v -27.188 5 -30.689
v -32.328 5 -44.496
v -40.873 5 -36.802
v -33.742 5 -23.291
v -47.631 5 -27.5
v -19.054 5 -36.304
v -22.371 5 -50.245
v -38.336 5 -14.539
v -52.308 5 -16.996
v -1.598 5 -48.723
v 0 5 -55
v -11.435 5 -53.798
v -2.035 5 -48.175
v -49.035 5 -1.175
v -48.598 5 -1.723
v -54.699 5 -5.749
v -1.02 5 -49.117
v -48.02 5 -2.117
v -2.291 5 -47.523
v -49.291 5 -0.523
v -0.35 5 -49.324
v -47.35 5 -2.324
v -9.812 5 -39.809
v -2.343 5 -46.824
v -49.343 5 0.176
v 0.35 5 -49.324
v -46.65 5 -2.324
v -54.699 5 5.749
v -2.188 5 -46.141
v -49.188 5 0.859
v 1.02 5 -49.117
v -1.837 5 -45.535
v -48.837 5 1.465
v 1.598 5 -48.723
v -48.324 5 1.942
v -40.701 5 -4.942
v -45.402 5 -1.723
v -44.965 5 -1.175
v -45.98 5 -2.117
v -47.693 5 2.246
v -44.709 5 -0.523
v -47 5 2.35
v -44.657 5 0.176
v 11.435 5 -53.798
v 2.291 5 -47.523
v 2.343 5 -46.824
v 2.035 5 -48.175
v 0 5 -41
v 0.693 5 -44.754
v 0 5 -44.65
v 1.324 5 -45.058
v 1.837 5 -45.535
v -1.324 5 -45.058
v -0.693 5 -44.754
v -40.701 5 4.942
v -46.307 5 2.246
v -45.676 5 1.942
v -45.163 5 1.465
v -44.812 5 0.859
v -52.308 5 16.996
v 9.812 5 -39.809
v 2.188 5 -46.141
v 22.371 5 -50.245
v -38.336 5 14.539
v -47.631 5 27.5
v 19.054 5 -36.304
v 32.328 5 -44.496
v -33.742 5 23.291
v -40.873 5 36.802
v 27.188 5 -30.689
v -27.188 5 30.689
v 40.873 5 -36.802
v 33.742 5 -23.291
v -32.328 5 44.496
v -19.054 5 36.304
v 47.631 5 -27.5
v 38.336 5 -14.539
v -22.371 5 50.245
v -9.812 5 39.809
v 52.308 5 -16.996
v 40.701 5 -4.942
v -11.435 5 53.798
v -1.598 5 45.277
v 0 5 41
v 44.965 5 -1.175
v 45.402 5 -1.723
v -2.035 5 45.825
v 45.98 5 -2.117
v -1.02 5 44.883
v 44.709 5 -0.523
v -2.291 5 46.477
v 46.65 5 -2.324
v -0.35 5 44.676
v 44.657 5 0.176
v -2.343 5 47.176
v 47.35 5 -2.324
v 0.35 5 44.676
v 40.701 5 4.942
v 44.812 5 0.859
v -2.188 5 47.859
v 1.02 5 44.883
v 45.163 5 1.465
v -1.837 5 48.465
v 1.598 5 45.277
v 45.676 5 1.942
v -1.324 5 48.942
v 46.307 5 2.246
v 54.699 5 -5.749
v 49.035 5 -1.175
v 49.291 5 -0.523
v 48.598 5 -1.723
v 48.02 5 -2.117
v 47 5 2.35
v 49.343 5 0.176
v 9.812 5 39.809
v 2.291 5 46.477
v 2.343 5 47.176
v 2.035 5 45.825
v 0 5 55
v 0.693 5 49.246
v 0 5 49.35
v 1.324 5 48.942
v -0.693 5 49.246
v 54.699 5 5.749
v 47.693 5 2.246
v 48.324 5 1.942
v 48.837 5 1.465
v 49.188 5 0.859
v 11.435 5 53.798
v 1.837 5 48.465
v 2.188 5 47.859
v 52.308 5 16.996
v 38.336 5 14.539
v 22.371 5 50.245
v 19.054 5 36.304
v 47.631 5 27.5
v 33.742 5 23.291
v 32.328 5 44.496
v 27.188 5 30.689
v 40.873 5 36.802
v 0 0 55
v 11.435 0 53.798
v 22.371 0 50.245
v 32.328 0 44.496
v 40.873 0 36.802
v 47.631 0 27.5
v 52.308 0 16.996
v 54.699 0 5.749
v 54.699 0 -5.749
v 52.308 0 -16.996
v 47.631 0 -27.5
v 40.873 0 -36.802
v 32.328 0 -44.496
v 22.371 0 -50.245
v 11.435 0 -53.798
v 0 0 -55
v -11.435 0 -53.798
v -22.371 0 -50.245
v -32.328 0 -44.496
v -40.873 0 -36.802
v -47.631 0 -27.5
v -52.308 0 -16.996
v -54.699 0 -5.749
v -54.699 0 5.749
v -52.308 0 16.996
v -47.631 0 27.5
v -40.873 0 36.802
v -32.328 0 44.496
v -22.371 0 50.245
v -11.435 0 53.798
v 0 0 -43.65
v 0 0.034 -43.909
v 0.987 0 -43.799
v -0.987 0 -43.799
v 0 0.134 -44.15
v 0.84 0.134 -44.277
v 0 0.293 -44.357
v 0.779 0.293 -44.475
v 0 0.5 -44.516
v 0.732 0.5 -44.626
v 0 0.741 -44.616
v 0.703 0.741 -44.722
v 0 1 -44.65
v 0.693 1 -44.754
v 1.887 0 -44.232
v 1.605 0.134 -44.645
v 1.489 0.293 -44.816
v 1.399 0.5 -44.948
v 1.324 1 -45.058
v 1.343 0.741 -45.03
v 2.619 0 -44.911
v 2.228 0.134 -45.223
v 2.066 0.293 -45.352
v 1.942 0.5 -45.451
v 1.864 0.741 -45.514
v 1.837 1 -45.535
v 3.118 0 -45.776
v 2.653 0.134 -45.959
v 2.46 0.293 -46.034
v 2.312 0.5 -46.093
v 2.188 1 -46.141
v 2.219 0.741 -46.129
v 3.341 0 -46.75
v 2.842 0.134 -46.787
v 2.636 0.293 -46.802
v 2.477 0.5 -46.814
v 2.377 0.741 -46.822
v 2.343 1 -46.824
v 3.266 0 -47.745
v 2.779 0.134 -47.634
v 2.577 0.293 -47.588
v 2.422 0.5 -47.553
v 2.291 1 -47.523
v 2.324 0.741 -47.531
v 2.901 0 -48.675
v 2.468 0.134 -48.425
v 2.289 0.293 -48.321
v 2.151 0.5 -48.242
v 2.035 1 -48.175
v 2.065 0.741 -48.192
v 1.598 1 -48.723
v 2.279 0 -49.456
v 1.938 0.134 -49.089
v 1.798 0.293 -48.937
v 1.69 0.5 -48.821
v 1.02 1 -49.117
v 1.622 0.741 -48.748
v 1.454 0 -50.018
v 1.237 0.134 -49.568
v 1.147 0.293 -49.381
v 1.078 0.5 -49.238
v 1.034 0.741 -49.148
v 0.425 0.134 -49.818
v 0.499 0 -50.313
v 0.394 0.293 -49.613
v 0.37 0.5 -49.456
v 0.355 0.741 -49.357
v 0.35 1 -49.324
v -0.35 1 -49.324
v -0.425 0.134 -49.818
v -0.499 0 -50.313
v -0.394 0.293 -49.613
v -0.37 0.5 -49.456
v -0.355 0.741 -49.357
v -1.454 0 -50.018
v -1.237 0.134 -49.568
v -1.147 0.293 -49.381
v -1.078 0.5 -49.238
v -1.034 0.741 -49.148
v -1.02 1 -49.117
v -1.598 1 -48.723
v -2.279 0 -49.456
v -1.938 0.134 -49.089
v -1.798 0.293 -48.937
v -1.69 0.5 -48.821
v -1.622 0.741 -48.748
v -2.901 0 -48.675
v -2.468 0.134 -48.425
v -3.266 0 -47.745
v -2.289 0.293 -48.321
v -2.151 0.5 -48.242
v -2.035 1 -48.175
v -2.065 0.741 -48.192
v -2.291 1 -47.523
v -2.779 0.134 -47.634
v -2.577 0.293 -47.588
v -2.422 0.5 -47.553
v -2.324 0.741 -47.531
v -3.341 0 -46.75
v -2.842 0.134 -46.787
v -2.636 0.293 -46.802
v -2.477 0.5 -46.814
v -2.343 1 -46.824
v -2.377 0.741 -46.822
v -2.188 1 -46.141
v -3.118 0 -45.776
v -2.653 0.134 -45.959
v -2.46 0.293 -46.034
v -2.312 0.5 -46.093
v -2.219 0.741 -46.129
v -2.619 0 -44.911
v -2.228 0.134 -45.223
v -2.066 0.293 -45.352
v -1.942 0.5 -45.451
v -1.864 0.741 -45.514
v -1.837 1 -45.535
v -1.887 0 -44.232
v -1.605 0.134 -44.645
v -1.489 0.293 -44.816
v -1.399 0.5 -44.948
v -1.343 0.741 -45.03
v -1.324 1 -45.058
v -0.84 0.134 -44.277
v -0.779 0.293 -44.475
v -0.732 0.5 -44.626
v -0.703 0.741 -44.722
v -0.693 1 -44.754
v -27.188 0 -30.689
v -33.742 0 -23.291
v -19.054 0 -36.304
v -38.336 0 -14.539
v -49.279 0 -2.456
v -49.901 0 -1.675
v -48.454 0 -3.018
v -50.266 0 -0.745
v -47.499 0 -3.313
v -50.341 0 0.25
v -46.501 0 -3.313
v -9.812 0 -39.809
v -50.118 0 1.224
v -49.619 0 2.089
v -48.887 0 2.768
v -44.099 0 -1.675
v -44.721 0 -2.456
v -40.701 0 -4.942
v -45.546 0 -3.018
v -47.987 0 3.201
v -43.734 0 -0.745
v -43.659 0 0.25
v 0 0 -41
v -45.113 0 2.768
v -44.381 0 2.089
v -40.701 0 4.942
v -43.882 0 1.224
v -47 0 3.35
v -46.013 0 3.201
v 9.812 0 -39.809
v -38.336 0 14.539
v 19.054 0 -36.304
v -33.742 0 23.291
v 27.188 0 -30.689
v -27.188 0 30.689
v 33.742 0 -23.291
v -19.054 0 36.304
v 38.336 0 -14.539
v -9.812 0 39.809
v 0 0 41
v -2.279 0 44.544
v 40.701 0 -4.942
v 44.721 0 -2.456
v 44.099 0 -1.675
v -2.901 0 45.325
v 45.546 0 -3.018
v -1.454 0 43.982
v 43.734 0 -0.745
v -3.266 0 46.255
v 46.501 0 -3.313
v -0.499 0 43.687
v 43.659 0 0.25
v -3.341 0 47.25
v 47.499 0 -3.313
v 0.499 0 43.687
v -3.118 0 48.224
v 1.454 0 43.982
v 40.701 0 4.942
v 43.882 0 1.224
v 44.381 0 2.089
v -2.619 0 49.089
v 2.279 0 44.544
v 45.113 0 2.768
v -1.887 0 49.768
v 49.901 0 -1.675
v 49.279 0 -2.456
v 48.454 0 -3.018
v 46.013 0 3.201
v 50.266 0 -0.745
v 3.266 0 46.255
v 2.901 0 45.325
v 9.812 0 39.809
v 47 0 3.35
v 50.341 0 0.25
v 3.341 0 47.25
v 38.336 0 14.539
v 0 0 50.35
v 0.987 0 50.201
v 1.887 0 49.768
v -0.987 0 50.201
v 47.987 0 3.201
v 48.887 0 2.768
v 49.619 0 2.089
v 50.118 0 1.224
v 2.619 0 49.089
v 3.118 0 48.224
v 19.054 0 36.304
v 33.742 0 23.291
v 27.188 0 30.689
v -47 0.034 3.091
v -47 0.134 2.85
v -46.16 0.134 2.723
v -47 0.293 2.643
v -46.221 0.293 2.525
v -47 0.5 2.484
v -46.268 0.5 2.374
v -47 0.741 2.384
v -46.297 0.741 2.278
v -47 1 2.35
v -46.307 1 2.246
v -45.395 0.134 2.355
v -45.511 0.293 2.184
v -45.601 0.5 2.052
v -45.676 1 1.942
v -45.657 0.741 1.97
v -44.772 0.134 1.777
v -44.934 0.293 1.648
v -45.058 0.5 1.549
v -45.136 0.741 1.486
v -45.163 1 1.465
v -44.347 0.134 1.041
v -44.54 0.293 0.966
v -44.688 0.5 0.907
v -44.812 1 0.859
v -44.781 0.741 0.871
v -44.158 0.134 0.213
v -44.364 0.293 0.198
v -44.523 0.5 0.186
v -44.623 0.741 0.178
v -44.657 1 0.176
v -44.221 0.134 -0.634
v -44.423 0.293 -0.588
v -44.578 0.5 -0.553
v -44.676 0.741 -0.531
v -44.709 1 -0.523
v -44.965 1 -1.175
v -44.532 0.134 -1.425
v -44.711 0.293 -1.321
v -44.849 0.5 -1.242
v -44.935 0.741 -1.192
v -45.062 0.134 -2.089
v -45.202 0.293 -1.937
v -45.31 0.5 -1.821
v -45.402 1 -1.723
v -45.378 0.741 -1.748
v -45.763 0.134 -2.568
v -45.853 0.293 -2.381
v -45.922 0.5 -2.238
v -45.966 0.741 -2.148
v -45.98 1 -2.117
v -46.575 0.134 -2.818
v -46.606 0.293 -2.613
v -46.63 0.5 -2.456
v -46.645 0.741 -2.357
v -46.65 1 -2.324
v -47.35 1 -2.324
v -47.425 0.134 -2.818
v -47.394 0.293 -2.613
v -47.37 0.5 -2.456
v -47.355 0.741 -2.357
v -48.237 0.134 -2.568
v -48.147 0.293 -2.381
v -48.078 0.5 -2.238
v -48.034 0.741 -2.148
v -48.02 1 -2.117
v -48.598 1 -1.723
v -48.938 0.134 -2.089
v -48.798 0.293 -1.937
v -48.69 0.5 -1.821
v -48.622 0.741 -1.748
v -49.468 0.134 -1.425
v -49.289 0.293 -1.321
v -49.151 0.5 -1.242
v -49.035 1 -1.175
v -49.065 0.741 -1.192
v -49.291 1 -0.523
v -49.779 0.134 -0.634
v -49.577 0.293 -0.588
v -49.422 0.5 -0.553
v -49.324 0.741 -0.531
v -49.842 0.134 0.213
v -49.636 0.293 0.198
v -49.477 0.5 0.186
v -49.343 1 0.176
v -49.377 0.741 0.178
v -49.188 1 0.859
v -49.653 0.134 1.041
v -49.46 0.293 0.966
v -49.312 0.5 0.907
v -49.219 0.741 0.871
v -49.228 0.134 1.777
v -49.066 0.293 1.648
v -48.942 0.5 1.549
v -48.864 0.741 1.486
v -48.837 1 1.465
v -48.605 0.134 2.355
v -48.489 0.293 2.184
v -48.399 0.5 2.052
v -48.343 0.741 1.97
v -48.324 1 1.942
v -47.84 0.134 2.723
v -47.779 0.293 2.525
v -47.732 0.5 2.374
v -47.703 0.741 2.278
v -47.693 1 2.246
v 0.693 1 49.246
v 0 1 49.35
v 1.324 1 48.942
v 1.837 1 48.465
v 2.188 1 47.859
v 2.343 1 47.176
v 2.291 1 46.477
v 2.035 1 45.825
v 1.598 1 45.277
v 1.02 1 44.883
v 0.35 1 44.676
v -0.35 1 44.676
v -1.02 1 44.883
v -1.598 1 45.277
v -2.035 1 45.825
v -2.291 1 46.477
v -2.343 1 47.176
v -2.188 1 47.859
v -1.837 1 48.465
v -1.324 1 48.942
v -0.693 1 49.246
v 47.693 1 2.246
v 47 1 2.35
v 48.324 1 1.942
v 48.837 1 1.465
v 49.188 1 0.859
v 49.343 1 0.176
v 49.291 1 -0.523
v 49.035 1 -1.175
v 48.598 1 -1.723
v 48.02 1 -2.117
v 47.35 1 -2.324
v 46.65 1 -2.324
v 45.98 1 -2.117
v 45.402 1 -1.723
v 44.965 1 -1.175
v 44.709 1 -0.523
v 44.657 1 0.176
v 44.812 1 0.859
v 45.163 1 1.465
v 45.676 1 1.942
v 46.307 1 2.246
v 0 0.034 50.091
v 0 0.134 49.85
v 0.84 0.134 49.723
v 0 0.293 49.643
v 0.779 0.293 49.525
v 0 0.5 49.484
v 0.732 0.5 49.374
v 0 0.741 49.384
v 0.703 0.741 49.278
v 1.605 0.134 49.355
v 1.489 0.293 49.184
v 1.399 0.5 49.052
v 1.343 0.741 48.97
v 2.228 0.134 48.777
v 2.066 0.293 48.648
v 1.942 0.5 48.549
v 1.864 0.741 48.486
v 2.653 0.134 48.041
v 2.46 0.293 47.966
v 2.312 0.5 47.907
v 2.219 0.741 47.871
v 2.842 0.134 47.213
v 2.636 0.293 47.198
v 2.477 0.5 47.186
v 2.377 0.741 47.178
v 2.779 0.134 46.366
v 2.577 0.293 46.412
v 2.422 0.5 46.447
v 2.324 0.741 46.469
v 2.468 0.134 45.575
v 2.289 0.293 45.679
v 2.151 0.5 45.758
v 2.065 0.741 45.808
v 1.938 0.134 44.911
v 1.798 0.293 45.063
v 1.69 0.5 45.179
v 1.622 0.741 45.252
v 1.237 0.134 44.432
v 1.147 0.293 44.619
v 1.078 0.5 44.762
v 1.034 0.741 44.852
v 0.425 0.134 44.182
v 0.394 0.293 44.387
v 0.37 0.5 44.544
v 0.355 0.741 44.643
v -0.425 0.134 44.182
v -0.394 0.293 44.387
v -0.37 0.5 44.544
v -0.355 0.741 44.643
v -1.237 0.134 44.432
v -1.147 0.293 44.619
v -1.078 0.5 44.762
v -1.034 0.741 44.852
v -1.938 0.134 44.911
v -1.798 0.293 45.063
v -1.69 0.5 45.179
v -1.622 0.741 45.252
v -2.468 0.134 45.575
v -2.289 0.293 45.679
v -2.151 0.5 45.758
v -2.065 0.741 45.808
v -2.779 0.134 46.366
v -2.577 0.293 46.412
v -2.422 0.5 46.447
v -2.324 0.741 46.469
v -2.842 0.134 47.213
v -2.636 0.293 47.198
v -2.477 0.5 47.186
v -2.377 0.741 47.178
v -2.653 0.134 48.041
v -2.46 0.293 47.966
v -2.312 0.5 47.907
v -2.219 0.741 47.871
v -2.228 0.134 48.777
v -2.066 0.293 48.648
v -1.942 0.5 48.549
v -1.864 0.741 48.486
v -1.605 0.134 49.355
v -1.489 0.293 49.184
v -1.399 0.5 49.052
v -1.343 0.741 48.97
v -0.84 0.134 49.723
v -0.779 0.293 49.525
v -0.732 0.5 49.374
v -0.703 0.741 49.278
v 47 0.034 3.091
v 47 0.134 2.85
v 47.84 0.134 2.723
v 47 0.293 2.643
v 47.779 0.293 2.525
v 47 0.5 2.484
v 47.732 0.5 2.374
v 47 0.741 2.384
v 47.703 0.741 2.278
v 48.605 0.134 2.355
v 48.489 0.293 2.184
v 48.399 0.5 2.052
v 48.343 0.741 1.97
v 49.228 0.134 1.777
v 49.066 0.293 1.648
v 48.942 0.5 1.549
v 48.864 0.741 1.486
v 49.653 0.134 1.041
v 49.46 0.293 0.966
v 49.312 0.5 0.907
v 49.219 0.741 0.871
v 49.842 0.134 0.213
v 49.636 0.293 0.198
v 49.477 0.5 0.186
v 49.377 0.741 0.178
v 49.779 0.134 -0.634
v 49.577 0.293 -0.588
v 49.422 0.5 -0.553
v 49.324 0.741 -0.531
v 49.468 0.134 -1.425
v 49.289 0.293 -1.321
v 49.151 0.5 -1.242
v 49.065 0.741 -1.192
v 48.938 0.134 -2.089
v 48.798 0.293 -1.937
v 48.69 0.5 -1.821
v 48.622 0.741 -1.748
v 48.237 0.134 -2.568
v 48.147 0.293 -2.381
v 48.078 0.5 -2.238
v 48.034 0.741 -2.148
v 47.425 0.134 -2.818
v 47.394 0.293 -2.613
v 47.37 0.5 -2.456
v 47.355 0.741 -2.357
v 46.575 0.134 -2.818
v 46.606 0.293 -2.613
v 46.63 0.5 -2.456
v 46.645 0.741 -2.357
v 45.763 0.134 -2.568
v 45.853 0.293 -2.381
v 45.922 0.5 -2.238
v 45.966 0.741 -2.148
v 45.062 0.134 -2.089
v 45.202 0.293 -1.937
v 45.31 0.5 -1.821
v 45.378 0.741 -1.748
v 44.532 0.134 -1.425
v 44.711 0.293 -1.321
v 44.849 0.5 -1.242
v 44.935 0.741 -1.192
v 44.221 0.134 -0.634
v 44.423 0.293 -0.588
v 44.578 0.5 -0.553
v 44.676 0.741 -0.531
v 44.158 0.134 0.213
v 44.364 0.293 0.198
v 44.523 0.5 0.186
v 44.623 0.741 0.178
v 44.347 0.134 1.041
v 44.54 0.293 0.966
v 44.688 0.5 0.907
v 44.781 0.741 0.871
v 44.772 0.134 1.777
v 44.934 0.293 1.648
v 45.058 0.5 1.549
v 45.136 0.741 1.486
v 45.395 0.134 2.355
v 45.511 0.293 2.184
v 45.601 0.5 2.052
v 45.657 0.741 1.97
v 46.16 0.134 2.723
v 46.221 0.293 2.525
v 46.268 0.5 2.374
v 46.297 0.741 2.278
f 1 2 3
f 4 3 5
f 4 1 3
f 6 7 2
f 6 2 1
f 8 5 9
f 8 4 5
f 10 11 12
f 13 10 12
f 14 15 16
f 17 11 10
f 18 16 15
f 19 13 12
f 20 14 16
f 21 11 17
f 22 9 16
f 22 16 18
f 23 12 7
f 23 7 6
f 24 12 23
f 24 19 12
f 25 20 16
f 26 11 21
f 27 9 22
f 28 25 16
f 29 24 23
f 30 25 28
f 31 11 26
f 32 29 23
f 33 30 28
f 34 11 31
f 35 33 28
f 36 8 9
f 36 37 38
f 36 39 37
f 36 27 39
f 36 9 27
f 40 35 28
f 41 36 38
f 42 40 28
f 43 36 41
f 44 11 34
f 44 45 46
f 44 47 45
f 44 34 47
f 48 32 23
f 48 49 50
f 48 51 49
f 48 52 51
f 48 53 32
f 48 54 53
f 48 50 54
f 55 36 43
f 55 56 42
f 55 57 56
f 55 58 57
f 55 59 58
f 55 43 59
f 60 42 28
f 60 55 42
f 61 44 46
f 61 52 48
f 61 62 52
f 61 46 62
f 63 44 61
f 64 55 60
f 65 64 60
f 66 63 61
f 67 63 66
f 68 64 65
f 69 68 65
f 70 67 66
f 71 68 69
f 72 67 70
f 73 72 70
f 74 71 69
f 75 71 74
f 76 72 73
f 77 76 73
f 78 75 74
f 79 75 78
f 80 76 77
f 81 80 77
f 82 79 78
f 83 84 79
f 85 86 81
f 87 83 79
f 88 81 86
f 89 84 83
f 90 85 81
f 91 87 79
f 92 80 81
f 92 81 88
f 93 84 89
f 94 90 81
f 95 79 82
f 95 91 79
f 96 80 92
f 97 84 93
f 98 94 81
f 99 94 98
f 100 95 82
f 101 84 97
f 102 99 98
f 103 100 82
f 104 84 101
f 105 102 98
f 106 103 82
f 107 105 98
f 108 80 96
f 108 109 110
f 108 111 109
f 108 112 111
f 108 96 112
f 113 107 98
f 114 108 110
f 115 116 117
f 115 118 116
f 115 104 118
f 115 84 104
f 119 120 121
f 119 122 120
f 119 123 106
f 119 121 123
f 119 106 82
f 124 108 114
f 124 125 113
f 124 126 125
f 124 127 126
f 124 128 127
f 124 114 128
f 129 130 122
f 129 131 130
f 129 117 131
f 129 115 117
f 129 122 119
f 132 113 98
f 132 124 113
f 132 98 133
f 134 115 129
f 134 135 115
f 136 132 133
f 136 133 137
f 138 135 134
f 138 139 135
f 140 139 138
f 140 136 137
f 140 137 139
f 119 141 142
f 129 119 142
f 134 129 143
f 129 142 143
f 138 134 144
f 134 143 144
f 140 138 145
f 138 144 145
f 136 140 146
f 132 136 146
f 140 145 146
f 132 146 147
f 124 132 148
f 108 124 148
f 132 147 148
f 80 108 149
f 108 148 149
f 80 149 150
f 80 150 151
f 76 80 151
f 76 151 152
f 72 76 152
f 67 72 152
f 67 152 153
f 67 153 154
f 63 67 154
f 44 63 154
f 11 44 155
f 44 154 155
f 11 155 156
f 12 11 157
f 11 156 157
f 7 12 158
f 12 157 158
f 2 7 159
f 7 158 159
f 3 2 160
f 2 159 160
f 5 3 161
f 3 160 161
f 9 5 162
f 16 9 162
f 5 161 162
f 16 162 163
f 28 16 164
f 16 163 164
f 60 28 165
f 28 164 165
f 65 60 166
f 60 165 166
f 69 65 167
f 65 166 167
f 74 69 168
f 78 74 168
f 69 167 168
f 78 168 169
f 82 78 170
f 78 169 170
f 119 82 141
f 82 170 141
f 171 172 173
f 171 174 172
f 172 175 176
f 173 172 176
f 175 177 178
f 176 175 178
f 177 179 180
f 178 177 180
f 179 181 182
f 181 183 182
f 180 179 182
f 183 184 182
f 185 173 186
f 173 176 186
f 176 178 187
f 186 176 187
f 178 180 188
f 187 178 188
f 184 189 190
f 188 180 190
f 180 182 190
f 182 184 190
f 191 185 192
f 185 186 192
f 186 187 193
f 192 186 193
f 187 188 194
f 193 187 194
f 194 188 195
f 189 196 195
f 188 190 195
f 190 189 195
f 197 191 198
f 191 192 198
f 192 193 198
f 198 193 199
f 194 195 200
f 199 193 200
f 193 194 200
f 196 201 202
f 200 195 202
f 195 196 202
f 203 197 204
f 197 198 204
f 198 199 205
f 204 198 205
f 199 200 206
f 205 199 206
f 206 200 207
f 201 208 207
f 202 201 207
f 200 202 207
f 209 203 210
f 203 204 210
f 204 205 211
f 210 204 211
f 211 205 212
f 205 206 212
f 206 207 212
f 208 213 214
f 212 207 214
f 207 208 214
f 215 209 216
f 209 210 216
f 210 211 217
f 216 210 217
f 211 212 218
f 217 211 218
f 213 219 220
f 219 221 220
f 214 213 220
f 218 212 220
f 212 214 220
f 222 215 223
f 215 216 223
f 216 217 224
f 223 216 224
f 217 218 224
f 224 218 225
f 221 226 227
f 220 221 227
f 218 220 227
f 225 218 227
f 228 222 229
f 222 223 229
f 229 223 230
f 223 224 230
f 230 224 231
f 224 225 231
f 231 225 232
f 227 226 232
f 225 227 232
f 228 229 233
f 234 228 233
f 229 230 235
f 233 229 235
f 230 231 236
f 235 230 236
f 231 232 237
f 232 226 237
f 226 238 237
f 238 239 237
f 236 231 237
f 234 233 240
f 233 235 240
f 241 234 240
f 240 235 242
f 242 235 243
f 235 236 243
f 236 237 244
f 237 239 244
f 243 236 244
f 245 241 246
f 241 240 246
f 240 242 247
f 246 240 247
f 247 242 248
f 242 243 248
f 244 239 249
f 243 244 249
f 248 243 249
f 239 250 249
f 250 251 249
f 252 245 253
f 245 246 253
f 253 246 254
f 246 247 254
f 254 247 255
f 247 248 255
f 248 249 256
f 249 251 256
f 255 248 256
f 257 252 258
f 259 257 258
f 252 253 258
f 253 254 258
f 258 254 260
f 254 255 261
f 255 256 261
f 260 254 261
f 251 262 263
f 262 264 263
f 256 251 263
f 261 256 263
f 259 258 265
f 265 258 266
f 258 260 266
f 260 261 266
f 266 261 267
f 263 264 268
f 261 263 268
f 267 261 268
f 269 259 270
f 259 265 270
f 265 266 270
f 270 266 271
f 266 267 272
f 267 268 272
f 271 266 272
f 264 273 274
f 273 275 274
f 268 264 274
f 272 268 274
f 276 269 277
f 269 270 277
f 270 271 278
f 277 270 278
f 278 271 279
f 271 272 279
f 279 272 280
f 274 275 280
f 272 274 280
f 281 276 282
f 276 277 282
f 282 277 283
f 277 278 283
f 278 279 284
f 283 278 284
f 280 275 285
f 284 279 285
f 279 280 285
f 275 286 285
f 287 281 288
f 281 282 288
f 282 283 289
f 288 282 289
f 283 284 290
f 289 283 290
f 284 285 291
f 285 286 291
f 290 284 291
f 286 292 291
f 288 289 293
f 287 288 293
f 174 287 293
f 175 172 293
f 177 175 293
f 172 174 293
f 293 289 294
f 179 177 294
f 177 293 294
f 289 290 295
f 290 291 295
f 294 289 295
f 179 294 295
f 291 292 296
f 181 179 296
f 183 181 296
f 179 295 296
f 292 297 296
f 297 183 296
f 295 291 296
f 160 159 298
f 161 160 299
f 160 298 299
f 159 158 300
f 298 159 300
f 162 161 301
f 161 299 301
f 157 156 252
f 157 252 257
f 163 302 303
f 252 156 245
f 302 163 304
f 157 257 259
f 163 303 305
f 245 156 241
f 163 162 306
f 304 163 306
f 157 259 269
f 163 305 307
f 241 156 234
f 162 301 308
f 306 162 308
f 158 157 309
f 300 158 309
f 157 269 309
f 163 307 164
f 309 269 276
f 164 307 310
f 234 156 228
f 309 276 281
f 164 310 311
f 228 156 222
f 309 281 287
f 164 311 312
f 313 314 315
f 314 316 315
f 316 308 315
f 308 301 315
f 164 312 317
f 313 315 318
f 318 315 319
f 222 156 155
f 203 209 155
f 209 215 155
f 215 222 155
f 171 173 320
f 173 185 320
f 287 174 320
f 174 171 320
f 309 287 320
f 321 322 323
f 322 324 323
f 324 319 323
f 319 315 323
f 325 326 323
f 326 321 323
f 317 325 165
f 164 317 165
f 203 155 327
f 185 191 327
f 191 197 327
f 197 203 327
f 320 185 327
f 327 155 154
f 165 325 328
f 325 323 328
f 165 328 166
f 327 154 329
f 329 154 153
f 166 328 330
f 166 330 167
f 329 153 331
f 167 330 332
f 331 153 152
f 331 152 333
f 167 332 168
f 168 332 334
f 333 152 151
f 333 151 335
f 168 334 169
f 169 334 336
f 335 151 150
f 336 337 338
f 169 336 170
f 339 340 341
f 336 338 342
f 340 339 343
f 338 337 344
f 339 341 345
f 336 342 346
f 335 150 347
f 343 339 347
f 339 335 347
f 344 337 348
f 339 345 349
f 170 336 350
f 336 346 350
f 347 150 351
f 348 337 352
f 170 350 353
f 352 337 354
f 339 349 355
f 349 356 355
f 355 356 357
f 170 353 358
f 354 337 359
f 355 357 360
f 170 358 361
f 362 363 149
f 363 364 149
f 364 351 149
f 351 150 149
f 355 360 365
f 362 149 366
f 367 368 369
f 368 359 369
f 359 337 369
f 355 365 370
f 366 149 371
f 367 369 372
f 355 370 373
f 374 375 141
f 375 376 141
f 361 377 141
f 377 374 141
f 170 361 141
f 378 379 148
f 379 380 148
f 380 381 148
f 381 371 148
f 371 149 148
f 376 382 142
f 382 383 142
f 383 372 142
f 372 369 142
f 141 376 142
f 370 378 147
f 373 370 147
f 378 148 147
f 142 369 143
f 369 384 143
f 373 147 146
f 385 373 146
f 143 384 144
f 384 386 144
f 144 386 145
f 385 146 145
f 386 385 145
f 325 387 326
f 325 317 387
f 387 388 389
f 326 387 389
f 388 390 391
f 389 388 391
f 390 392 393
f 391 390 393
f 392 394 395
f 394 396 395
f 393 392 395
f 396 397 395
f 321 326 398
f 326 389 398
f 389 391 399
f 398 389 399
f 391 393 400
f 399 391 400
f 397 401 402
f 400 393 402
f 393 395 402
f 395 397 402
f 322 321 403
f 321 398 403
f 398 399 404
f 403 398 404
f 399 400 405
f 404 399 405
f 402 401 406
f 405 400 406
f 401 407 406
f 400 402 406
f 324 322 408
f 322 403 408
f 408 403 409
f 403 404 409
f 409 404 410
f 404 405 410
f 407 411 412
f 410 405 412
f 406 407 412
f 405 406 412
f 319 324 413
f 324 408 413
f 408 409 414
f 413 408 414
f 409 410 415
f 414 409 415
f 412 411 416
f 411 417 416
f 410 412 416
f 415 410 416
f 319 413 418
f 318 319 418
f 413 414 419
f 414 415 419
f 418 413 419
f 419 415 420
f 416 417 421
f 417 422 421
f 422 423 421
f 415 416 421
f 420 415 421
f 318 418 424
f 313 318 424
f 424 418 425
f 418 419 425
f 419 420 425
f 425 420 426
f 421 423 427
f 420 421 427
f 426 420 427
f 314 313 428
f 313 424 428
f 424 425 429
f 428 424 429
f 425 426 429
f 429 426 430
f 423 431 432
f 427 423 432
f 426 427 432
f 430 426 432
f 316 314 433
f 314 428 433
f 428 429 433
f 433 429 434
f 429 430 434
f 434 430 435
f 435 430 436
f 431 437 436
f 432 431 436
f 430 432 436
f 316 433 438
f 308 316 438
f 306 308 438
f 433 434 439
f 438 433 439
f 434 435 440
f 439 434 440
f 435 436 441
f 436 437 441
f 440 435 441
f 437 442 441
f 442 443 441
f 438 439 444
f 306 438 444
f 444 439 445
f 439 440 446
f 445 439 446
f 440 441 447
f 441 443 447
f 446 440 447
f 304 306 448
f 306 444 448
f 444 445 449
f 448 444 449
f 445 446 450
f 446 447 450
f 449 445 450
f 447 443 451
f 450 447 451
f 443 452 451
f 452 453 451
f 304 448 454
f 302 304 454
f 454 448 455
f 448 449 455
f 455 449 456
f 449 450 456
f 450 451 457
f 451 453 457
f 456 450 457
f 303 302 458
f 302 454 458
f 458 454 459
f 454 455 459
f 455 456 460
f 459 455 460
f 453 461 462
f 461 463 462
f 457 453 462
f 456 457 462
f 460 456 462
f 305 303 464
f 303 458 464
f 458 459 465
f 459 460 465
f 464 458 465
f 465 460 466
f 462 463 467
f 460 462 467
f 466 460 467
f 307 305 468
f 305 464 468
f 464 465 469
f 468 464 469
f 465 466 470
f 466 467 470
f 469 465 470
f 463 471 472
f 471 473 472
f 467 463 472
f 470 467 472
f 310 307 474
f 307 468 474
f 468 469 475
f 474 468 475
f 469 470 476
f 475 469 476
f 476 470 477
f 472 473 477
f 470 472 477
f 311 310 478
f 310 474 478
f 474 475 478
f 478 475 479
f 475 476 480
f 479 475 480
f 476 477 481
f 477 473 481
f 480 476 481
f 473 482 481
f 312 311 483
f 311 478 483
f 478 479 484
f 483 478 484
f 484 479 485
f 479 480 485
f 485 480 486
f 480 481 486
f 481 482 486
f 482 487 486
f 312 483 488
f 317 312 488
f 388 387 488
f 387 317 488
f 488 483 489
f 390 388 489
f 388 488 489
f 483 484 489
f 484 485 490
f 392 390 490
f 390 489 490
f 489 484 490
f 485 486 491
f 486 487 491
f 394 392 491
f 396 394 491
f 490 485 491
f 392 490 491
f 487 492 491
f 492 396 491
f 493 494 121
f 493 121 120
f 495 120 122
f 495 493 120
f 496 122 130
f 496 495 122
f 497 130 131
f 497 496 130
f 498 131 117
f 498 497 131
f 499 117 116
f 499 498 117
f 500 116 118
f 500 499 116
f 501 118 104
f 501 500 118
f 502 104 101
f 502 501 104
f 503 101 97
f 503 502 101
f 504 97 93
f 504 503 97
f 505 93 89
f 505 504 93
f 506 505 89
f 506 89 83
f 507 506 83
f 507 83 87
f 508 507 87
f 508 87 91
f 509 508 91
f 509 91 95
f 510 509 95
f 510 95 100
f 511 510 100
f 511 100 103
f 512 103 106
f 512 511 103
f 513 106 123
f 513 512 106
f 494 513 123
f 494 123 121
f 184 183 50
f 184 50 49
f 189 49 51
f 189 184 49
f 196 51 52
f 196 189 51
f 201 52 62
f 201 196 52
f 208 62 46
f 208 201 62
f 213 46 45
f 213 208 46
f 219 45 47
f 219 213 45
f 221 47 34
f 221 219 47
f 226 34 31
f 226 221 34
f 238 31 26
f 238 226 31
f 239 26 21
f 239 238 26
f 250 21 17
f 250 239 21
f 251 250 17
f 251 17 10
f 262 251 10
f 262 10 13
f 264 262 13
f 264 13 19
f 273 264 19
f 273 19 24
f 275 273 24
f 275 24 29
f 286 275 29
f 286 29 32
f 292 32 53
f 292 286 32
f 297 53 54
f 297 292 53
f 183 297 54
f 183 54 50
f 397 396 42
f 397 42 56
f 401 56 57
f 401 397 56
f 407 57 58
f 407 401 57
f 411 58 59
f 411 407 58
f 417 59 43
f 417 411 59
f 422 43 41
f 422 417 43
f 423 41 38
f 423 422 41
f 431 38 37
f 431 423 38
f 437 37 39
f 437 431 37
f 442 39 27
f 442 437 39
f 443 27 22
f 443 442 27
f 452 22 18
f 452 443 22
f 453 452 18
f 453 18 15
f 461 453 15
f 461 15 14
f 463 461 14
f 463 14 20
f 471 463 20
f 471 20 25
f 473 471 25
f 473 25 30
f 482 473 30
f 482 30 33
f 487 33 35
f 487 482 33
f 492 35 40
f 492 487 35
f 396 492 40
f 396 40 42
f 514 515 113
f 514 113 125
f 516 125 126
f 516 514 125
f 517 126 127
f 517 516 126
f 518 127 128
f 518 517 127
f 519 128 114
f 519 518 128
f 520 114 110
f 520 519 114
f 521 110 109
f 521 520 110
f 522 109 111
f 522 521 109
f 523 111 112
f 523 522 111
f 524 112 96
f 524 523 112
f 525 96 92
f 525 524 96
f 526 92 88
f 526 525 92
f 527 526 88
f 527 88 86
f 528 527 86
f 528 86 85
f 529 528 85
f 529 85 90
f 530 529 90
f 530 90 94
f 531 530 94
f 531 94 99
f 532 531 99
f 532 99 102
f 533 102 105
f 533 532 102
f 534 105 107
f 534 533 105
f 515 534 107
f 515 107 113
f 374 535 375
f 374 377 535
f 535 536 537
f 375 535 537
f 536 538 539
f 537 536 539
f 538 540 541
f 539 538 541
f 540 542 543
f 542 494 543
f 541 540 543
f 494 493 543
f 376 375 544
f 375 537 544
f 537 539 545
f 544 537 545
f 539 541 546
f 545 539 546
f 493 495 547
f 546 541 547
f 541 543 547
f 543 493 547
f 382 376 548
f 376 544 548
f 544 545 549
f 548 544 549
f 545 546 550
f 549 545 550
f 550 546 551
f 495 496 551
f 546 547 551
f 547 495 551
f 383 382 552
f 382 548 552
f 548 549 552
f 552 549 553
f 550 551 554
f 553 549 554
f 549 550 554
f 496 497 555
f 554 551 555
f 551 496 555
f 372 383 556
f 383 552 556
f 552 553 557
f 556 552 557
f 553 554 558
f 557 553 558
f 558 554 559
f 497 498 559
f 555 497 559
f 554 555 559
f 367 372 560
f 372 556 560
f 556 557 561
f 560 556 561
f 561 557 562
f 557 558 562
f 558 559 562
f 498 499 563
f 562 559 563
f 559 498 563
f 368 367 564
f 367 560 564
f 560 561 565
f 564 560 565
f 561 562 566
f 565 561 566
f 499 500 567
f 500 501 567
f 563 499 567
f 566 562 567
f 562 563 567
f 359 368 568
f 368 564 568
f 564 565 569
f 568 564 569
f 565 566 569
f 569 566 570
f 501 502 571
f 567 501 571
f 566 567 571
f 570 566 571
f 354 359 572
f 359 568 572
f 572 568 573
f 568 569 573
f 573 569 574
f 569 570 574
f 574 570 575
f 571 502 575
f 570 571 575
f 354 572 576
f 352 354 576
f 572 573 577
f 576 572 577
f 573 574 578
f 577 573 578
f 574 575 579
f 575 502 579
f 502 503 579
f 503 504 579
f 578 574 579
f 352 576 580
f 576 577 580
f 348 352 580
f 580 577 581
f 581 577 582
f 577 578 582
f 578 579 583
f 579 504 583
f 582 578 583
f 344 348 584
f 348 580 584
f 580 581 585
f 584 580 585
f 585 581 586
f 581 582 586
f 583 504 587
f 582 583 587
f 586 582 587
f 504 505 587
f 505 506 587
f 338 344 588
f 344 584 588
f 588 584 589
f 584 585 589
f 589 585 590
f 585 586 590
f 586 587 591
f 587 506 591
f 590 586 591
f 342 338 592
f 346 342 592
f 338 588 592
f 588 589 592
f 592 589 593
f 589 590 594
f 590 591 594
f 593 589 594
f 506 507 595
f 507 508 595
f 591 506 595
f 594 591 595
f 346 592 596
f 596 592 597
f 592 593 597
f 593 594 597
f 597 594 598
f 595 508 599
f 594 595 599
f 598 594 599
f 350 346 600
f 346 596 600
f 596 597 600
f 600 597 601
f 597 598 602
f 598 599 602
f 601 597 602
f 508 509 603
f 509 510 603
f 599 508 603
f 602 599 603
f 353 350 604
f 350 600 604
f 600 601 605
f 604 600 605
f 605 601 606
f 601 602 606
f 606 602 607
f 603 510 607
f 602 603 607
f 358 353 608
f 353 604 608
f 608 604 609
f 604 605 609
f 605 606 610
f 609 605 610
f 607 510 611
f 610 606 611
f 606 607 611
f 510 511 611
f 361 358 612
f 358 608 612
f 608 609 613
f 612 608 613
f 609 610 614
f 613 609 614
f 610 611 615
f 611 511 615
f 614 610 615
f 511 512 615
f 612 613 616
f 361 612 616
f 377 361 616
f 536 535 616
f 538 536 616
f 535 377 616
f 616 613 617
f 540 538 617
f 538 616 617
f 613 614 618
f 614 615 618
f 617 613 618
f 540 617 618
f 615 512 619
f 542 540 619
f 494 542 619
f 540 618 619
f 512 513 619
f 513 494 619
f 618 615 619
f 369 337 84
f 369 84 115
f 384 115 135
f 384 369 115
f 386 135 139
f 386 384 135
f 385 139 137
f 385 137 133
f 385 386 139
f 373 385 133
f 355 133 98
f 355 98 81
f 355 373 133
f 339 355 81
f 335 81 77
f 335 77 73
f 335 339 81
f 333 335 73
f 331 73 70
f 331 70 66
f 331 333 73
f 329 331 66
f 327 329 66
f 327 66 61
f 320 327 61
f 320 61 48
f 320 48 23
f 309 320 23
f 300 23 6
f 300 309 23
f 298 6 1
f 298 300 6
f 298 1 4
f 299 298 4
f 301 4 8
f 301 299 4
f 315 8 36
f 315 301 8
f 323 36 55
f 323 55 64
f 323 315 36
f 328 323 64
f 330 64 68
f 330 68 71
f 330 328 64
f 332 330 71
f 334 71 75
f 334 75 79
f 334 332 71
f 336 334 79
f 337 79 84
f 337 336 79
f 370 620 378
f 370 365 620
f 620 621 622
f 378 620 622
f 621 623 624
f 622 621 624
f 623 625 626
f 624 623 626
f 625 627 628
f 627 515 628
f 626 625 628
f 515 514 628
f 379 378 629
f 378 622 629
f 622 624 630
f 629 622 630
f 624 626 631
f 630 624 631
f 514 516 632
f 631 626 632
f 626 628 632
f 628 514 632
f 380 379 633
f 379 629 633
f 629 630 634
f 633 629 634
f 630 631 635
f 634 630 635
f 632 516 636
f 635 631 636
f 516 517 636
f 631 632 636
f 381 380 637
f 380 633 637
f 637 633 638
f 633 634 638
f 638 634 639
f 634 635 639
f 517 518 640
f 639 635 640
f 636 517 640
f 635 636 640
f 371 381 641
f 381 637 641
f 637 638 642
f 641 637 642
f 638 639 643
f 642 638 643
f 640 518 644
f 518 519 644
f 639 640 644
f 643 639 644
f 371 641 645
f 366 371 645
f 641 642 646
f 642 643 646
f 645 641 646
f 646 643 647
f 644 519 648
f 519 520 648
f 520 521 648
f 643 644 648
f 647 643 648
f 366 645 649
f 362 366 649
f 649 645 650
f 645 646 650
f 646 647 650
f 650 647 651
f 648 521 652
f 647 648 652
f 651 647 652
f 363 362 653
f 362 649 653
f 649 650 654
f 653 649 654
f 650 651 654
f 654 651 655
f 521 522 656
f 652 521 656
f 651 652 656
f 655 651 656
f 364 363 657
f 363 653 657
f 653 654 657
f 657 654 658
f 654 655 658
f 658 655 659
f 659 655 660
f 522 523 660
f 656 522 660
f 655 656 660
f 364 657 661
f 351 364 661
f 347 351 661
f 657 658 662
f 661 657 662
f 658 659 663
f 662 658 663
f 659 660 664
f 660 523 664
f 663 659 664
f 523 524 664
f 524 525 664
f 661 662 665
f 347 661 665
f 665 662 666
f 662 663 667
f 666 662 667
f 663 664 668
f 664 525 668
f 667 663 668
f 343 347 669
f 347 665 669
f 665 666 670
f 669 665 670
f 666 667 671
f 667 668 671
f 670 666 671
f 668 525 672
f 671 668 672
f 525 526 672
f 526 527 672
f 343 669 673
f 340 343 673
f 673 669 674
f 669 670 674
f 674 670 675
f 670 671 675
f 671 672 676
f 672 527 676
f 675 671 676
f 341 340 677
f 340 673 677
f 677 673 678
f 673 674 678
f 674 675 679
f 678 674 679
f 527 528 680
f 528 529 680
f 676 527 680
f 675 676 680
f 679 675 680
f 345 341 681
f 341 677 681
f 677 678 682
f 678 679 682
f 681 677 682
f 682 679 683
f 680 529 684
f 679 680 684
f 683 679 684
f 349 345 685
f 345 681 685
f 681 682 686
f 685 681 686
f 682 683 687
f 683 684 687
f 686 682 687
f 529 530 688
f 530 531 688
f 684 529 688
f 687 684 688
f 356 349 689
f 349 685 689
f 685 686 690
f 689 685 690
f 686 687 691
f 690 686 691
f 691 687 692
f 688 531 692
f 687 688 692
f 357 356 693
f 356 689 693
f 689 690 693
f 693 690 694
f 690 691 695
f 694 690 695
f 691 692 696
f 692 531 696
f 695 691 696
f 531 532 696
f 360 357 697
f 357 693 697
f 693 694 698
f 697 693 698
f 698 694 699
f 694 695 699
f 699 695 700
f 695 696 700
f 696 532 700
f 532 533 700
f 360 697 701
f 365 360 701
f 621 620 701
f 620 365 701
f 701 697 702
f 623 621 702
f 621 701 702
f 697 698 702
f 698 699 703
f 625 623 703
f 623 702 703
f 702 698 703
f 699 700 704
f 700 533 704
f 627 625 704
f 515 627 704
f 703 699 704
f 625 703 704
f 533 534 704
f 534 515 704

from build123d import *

# Parameters (mm, degrees)
SKETCH_2_R          = 55
SKETCH_2_R_2        = 41
EXTRUDE_1_DEPTH     = 5
SKETCH_5_R          = 2.35
CUT_EXTRUDE_2_DEPTH = 5
FILLET_1_R          = 1


with BuildPart() as part:
    # 草图2 → 凸台-拉伸1 (new body)
    with BuildSketch(Plane(origin=(0, 0, 0), x_dir=(1, 0, 0), z_dir=(0, 1, 0))):
        with Locations(Location((0, 0, 0), (0, 0, 270))):
            Circle(SKETCH_2_R)
        with Locations(Location((0, 0, 0), (0, 0, 270))):
            Circle(SKETCH_2_R_2, mode=Mode.SUBTRACT)
    extrude(amount=EXTRUDE_1_DEPTH)

    # 草图5 → 切除-拉伸2 (cut)
    with BuildSketch(Plane(origin=(0, 0, 0), x_dir=(1, 0, 0), z_dir=(0, 1, 0))):
        with Locations(Location((0, -47, 0), (0, 0, 270))):
            Circle(SKETCH_5_R)
        with Locations(Location((-47, 0, 0), (0, 0, 270))):
            Circle(SKETCH_5_R)
        with Locations(Location((0, 47, 0), (0, 0, 270))):
            Circle(SKETCH_5_R)
        with Locations(Location((47, 0, 0), (0, 0, 270))):
            Circle(SKETCH_5_R)
    extrude(amount=CUT_EXTRUDE_2_DEPTH, mode=Mode.SUBTRACT)

    # 圆角1
    fillet_1_edges = [part.edges().sort_by_distance(p)[0] for p in [
        (0, 0, 44.65),
        (0, 0, -49.35),
        (-47, 0, -2.35),
        (47, 0, -2.35),
    ]]
    fillet(fillet_1_edges, radius=FILLET_1_R)


solid = part.part
